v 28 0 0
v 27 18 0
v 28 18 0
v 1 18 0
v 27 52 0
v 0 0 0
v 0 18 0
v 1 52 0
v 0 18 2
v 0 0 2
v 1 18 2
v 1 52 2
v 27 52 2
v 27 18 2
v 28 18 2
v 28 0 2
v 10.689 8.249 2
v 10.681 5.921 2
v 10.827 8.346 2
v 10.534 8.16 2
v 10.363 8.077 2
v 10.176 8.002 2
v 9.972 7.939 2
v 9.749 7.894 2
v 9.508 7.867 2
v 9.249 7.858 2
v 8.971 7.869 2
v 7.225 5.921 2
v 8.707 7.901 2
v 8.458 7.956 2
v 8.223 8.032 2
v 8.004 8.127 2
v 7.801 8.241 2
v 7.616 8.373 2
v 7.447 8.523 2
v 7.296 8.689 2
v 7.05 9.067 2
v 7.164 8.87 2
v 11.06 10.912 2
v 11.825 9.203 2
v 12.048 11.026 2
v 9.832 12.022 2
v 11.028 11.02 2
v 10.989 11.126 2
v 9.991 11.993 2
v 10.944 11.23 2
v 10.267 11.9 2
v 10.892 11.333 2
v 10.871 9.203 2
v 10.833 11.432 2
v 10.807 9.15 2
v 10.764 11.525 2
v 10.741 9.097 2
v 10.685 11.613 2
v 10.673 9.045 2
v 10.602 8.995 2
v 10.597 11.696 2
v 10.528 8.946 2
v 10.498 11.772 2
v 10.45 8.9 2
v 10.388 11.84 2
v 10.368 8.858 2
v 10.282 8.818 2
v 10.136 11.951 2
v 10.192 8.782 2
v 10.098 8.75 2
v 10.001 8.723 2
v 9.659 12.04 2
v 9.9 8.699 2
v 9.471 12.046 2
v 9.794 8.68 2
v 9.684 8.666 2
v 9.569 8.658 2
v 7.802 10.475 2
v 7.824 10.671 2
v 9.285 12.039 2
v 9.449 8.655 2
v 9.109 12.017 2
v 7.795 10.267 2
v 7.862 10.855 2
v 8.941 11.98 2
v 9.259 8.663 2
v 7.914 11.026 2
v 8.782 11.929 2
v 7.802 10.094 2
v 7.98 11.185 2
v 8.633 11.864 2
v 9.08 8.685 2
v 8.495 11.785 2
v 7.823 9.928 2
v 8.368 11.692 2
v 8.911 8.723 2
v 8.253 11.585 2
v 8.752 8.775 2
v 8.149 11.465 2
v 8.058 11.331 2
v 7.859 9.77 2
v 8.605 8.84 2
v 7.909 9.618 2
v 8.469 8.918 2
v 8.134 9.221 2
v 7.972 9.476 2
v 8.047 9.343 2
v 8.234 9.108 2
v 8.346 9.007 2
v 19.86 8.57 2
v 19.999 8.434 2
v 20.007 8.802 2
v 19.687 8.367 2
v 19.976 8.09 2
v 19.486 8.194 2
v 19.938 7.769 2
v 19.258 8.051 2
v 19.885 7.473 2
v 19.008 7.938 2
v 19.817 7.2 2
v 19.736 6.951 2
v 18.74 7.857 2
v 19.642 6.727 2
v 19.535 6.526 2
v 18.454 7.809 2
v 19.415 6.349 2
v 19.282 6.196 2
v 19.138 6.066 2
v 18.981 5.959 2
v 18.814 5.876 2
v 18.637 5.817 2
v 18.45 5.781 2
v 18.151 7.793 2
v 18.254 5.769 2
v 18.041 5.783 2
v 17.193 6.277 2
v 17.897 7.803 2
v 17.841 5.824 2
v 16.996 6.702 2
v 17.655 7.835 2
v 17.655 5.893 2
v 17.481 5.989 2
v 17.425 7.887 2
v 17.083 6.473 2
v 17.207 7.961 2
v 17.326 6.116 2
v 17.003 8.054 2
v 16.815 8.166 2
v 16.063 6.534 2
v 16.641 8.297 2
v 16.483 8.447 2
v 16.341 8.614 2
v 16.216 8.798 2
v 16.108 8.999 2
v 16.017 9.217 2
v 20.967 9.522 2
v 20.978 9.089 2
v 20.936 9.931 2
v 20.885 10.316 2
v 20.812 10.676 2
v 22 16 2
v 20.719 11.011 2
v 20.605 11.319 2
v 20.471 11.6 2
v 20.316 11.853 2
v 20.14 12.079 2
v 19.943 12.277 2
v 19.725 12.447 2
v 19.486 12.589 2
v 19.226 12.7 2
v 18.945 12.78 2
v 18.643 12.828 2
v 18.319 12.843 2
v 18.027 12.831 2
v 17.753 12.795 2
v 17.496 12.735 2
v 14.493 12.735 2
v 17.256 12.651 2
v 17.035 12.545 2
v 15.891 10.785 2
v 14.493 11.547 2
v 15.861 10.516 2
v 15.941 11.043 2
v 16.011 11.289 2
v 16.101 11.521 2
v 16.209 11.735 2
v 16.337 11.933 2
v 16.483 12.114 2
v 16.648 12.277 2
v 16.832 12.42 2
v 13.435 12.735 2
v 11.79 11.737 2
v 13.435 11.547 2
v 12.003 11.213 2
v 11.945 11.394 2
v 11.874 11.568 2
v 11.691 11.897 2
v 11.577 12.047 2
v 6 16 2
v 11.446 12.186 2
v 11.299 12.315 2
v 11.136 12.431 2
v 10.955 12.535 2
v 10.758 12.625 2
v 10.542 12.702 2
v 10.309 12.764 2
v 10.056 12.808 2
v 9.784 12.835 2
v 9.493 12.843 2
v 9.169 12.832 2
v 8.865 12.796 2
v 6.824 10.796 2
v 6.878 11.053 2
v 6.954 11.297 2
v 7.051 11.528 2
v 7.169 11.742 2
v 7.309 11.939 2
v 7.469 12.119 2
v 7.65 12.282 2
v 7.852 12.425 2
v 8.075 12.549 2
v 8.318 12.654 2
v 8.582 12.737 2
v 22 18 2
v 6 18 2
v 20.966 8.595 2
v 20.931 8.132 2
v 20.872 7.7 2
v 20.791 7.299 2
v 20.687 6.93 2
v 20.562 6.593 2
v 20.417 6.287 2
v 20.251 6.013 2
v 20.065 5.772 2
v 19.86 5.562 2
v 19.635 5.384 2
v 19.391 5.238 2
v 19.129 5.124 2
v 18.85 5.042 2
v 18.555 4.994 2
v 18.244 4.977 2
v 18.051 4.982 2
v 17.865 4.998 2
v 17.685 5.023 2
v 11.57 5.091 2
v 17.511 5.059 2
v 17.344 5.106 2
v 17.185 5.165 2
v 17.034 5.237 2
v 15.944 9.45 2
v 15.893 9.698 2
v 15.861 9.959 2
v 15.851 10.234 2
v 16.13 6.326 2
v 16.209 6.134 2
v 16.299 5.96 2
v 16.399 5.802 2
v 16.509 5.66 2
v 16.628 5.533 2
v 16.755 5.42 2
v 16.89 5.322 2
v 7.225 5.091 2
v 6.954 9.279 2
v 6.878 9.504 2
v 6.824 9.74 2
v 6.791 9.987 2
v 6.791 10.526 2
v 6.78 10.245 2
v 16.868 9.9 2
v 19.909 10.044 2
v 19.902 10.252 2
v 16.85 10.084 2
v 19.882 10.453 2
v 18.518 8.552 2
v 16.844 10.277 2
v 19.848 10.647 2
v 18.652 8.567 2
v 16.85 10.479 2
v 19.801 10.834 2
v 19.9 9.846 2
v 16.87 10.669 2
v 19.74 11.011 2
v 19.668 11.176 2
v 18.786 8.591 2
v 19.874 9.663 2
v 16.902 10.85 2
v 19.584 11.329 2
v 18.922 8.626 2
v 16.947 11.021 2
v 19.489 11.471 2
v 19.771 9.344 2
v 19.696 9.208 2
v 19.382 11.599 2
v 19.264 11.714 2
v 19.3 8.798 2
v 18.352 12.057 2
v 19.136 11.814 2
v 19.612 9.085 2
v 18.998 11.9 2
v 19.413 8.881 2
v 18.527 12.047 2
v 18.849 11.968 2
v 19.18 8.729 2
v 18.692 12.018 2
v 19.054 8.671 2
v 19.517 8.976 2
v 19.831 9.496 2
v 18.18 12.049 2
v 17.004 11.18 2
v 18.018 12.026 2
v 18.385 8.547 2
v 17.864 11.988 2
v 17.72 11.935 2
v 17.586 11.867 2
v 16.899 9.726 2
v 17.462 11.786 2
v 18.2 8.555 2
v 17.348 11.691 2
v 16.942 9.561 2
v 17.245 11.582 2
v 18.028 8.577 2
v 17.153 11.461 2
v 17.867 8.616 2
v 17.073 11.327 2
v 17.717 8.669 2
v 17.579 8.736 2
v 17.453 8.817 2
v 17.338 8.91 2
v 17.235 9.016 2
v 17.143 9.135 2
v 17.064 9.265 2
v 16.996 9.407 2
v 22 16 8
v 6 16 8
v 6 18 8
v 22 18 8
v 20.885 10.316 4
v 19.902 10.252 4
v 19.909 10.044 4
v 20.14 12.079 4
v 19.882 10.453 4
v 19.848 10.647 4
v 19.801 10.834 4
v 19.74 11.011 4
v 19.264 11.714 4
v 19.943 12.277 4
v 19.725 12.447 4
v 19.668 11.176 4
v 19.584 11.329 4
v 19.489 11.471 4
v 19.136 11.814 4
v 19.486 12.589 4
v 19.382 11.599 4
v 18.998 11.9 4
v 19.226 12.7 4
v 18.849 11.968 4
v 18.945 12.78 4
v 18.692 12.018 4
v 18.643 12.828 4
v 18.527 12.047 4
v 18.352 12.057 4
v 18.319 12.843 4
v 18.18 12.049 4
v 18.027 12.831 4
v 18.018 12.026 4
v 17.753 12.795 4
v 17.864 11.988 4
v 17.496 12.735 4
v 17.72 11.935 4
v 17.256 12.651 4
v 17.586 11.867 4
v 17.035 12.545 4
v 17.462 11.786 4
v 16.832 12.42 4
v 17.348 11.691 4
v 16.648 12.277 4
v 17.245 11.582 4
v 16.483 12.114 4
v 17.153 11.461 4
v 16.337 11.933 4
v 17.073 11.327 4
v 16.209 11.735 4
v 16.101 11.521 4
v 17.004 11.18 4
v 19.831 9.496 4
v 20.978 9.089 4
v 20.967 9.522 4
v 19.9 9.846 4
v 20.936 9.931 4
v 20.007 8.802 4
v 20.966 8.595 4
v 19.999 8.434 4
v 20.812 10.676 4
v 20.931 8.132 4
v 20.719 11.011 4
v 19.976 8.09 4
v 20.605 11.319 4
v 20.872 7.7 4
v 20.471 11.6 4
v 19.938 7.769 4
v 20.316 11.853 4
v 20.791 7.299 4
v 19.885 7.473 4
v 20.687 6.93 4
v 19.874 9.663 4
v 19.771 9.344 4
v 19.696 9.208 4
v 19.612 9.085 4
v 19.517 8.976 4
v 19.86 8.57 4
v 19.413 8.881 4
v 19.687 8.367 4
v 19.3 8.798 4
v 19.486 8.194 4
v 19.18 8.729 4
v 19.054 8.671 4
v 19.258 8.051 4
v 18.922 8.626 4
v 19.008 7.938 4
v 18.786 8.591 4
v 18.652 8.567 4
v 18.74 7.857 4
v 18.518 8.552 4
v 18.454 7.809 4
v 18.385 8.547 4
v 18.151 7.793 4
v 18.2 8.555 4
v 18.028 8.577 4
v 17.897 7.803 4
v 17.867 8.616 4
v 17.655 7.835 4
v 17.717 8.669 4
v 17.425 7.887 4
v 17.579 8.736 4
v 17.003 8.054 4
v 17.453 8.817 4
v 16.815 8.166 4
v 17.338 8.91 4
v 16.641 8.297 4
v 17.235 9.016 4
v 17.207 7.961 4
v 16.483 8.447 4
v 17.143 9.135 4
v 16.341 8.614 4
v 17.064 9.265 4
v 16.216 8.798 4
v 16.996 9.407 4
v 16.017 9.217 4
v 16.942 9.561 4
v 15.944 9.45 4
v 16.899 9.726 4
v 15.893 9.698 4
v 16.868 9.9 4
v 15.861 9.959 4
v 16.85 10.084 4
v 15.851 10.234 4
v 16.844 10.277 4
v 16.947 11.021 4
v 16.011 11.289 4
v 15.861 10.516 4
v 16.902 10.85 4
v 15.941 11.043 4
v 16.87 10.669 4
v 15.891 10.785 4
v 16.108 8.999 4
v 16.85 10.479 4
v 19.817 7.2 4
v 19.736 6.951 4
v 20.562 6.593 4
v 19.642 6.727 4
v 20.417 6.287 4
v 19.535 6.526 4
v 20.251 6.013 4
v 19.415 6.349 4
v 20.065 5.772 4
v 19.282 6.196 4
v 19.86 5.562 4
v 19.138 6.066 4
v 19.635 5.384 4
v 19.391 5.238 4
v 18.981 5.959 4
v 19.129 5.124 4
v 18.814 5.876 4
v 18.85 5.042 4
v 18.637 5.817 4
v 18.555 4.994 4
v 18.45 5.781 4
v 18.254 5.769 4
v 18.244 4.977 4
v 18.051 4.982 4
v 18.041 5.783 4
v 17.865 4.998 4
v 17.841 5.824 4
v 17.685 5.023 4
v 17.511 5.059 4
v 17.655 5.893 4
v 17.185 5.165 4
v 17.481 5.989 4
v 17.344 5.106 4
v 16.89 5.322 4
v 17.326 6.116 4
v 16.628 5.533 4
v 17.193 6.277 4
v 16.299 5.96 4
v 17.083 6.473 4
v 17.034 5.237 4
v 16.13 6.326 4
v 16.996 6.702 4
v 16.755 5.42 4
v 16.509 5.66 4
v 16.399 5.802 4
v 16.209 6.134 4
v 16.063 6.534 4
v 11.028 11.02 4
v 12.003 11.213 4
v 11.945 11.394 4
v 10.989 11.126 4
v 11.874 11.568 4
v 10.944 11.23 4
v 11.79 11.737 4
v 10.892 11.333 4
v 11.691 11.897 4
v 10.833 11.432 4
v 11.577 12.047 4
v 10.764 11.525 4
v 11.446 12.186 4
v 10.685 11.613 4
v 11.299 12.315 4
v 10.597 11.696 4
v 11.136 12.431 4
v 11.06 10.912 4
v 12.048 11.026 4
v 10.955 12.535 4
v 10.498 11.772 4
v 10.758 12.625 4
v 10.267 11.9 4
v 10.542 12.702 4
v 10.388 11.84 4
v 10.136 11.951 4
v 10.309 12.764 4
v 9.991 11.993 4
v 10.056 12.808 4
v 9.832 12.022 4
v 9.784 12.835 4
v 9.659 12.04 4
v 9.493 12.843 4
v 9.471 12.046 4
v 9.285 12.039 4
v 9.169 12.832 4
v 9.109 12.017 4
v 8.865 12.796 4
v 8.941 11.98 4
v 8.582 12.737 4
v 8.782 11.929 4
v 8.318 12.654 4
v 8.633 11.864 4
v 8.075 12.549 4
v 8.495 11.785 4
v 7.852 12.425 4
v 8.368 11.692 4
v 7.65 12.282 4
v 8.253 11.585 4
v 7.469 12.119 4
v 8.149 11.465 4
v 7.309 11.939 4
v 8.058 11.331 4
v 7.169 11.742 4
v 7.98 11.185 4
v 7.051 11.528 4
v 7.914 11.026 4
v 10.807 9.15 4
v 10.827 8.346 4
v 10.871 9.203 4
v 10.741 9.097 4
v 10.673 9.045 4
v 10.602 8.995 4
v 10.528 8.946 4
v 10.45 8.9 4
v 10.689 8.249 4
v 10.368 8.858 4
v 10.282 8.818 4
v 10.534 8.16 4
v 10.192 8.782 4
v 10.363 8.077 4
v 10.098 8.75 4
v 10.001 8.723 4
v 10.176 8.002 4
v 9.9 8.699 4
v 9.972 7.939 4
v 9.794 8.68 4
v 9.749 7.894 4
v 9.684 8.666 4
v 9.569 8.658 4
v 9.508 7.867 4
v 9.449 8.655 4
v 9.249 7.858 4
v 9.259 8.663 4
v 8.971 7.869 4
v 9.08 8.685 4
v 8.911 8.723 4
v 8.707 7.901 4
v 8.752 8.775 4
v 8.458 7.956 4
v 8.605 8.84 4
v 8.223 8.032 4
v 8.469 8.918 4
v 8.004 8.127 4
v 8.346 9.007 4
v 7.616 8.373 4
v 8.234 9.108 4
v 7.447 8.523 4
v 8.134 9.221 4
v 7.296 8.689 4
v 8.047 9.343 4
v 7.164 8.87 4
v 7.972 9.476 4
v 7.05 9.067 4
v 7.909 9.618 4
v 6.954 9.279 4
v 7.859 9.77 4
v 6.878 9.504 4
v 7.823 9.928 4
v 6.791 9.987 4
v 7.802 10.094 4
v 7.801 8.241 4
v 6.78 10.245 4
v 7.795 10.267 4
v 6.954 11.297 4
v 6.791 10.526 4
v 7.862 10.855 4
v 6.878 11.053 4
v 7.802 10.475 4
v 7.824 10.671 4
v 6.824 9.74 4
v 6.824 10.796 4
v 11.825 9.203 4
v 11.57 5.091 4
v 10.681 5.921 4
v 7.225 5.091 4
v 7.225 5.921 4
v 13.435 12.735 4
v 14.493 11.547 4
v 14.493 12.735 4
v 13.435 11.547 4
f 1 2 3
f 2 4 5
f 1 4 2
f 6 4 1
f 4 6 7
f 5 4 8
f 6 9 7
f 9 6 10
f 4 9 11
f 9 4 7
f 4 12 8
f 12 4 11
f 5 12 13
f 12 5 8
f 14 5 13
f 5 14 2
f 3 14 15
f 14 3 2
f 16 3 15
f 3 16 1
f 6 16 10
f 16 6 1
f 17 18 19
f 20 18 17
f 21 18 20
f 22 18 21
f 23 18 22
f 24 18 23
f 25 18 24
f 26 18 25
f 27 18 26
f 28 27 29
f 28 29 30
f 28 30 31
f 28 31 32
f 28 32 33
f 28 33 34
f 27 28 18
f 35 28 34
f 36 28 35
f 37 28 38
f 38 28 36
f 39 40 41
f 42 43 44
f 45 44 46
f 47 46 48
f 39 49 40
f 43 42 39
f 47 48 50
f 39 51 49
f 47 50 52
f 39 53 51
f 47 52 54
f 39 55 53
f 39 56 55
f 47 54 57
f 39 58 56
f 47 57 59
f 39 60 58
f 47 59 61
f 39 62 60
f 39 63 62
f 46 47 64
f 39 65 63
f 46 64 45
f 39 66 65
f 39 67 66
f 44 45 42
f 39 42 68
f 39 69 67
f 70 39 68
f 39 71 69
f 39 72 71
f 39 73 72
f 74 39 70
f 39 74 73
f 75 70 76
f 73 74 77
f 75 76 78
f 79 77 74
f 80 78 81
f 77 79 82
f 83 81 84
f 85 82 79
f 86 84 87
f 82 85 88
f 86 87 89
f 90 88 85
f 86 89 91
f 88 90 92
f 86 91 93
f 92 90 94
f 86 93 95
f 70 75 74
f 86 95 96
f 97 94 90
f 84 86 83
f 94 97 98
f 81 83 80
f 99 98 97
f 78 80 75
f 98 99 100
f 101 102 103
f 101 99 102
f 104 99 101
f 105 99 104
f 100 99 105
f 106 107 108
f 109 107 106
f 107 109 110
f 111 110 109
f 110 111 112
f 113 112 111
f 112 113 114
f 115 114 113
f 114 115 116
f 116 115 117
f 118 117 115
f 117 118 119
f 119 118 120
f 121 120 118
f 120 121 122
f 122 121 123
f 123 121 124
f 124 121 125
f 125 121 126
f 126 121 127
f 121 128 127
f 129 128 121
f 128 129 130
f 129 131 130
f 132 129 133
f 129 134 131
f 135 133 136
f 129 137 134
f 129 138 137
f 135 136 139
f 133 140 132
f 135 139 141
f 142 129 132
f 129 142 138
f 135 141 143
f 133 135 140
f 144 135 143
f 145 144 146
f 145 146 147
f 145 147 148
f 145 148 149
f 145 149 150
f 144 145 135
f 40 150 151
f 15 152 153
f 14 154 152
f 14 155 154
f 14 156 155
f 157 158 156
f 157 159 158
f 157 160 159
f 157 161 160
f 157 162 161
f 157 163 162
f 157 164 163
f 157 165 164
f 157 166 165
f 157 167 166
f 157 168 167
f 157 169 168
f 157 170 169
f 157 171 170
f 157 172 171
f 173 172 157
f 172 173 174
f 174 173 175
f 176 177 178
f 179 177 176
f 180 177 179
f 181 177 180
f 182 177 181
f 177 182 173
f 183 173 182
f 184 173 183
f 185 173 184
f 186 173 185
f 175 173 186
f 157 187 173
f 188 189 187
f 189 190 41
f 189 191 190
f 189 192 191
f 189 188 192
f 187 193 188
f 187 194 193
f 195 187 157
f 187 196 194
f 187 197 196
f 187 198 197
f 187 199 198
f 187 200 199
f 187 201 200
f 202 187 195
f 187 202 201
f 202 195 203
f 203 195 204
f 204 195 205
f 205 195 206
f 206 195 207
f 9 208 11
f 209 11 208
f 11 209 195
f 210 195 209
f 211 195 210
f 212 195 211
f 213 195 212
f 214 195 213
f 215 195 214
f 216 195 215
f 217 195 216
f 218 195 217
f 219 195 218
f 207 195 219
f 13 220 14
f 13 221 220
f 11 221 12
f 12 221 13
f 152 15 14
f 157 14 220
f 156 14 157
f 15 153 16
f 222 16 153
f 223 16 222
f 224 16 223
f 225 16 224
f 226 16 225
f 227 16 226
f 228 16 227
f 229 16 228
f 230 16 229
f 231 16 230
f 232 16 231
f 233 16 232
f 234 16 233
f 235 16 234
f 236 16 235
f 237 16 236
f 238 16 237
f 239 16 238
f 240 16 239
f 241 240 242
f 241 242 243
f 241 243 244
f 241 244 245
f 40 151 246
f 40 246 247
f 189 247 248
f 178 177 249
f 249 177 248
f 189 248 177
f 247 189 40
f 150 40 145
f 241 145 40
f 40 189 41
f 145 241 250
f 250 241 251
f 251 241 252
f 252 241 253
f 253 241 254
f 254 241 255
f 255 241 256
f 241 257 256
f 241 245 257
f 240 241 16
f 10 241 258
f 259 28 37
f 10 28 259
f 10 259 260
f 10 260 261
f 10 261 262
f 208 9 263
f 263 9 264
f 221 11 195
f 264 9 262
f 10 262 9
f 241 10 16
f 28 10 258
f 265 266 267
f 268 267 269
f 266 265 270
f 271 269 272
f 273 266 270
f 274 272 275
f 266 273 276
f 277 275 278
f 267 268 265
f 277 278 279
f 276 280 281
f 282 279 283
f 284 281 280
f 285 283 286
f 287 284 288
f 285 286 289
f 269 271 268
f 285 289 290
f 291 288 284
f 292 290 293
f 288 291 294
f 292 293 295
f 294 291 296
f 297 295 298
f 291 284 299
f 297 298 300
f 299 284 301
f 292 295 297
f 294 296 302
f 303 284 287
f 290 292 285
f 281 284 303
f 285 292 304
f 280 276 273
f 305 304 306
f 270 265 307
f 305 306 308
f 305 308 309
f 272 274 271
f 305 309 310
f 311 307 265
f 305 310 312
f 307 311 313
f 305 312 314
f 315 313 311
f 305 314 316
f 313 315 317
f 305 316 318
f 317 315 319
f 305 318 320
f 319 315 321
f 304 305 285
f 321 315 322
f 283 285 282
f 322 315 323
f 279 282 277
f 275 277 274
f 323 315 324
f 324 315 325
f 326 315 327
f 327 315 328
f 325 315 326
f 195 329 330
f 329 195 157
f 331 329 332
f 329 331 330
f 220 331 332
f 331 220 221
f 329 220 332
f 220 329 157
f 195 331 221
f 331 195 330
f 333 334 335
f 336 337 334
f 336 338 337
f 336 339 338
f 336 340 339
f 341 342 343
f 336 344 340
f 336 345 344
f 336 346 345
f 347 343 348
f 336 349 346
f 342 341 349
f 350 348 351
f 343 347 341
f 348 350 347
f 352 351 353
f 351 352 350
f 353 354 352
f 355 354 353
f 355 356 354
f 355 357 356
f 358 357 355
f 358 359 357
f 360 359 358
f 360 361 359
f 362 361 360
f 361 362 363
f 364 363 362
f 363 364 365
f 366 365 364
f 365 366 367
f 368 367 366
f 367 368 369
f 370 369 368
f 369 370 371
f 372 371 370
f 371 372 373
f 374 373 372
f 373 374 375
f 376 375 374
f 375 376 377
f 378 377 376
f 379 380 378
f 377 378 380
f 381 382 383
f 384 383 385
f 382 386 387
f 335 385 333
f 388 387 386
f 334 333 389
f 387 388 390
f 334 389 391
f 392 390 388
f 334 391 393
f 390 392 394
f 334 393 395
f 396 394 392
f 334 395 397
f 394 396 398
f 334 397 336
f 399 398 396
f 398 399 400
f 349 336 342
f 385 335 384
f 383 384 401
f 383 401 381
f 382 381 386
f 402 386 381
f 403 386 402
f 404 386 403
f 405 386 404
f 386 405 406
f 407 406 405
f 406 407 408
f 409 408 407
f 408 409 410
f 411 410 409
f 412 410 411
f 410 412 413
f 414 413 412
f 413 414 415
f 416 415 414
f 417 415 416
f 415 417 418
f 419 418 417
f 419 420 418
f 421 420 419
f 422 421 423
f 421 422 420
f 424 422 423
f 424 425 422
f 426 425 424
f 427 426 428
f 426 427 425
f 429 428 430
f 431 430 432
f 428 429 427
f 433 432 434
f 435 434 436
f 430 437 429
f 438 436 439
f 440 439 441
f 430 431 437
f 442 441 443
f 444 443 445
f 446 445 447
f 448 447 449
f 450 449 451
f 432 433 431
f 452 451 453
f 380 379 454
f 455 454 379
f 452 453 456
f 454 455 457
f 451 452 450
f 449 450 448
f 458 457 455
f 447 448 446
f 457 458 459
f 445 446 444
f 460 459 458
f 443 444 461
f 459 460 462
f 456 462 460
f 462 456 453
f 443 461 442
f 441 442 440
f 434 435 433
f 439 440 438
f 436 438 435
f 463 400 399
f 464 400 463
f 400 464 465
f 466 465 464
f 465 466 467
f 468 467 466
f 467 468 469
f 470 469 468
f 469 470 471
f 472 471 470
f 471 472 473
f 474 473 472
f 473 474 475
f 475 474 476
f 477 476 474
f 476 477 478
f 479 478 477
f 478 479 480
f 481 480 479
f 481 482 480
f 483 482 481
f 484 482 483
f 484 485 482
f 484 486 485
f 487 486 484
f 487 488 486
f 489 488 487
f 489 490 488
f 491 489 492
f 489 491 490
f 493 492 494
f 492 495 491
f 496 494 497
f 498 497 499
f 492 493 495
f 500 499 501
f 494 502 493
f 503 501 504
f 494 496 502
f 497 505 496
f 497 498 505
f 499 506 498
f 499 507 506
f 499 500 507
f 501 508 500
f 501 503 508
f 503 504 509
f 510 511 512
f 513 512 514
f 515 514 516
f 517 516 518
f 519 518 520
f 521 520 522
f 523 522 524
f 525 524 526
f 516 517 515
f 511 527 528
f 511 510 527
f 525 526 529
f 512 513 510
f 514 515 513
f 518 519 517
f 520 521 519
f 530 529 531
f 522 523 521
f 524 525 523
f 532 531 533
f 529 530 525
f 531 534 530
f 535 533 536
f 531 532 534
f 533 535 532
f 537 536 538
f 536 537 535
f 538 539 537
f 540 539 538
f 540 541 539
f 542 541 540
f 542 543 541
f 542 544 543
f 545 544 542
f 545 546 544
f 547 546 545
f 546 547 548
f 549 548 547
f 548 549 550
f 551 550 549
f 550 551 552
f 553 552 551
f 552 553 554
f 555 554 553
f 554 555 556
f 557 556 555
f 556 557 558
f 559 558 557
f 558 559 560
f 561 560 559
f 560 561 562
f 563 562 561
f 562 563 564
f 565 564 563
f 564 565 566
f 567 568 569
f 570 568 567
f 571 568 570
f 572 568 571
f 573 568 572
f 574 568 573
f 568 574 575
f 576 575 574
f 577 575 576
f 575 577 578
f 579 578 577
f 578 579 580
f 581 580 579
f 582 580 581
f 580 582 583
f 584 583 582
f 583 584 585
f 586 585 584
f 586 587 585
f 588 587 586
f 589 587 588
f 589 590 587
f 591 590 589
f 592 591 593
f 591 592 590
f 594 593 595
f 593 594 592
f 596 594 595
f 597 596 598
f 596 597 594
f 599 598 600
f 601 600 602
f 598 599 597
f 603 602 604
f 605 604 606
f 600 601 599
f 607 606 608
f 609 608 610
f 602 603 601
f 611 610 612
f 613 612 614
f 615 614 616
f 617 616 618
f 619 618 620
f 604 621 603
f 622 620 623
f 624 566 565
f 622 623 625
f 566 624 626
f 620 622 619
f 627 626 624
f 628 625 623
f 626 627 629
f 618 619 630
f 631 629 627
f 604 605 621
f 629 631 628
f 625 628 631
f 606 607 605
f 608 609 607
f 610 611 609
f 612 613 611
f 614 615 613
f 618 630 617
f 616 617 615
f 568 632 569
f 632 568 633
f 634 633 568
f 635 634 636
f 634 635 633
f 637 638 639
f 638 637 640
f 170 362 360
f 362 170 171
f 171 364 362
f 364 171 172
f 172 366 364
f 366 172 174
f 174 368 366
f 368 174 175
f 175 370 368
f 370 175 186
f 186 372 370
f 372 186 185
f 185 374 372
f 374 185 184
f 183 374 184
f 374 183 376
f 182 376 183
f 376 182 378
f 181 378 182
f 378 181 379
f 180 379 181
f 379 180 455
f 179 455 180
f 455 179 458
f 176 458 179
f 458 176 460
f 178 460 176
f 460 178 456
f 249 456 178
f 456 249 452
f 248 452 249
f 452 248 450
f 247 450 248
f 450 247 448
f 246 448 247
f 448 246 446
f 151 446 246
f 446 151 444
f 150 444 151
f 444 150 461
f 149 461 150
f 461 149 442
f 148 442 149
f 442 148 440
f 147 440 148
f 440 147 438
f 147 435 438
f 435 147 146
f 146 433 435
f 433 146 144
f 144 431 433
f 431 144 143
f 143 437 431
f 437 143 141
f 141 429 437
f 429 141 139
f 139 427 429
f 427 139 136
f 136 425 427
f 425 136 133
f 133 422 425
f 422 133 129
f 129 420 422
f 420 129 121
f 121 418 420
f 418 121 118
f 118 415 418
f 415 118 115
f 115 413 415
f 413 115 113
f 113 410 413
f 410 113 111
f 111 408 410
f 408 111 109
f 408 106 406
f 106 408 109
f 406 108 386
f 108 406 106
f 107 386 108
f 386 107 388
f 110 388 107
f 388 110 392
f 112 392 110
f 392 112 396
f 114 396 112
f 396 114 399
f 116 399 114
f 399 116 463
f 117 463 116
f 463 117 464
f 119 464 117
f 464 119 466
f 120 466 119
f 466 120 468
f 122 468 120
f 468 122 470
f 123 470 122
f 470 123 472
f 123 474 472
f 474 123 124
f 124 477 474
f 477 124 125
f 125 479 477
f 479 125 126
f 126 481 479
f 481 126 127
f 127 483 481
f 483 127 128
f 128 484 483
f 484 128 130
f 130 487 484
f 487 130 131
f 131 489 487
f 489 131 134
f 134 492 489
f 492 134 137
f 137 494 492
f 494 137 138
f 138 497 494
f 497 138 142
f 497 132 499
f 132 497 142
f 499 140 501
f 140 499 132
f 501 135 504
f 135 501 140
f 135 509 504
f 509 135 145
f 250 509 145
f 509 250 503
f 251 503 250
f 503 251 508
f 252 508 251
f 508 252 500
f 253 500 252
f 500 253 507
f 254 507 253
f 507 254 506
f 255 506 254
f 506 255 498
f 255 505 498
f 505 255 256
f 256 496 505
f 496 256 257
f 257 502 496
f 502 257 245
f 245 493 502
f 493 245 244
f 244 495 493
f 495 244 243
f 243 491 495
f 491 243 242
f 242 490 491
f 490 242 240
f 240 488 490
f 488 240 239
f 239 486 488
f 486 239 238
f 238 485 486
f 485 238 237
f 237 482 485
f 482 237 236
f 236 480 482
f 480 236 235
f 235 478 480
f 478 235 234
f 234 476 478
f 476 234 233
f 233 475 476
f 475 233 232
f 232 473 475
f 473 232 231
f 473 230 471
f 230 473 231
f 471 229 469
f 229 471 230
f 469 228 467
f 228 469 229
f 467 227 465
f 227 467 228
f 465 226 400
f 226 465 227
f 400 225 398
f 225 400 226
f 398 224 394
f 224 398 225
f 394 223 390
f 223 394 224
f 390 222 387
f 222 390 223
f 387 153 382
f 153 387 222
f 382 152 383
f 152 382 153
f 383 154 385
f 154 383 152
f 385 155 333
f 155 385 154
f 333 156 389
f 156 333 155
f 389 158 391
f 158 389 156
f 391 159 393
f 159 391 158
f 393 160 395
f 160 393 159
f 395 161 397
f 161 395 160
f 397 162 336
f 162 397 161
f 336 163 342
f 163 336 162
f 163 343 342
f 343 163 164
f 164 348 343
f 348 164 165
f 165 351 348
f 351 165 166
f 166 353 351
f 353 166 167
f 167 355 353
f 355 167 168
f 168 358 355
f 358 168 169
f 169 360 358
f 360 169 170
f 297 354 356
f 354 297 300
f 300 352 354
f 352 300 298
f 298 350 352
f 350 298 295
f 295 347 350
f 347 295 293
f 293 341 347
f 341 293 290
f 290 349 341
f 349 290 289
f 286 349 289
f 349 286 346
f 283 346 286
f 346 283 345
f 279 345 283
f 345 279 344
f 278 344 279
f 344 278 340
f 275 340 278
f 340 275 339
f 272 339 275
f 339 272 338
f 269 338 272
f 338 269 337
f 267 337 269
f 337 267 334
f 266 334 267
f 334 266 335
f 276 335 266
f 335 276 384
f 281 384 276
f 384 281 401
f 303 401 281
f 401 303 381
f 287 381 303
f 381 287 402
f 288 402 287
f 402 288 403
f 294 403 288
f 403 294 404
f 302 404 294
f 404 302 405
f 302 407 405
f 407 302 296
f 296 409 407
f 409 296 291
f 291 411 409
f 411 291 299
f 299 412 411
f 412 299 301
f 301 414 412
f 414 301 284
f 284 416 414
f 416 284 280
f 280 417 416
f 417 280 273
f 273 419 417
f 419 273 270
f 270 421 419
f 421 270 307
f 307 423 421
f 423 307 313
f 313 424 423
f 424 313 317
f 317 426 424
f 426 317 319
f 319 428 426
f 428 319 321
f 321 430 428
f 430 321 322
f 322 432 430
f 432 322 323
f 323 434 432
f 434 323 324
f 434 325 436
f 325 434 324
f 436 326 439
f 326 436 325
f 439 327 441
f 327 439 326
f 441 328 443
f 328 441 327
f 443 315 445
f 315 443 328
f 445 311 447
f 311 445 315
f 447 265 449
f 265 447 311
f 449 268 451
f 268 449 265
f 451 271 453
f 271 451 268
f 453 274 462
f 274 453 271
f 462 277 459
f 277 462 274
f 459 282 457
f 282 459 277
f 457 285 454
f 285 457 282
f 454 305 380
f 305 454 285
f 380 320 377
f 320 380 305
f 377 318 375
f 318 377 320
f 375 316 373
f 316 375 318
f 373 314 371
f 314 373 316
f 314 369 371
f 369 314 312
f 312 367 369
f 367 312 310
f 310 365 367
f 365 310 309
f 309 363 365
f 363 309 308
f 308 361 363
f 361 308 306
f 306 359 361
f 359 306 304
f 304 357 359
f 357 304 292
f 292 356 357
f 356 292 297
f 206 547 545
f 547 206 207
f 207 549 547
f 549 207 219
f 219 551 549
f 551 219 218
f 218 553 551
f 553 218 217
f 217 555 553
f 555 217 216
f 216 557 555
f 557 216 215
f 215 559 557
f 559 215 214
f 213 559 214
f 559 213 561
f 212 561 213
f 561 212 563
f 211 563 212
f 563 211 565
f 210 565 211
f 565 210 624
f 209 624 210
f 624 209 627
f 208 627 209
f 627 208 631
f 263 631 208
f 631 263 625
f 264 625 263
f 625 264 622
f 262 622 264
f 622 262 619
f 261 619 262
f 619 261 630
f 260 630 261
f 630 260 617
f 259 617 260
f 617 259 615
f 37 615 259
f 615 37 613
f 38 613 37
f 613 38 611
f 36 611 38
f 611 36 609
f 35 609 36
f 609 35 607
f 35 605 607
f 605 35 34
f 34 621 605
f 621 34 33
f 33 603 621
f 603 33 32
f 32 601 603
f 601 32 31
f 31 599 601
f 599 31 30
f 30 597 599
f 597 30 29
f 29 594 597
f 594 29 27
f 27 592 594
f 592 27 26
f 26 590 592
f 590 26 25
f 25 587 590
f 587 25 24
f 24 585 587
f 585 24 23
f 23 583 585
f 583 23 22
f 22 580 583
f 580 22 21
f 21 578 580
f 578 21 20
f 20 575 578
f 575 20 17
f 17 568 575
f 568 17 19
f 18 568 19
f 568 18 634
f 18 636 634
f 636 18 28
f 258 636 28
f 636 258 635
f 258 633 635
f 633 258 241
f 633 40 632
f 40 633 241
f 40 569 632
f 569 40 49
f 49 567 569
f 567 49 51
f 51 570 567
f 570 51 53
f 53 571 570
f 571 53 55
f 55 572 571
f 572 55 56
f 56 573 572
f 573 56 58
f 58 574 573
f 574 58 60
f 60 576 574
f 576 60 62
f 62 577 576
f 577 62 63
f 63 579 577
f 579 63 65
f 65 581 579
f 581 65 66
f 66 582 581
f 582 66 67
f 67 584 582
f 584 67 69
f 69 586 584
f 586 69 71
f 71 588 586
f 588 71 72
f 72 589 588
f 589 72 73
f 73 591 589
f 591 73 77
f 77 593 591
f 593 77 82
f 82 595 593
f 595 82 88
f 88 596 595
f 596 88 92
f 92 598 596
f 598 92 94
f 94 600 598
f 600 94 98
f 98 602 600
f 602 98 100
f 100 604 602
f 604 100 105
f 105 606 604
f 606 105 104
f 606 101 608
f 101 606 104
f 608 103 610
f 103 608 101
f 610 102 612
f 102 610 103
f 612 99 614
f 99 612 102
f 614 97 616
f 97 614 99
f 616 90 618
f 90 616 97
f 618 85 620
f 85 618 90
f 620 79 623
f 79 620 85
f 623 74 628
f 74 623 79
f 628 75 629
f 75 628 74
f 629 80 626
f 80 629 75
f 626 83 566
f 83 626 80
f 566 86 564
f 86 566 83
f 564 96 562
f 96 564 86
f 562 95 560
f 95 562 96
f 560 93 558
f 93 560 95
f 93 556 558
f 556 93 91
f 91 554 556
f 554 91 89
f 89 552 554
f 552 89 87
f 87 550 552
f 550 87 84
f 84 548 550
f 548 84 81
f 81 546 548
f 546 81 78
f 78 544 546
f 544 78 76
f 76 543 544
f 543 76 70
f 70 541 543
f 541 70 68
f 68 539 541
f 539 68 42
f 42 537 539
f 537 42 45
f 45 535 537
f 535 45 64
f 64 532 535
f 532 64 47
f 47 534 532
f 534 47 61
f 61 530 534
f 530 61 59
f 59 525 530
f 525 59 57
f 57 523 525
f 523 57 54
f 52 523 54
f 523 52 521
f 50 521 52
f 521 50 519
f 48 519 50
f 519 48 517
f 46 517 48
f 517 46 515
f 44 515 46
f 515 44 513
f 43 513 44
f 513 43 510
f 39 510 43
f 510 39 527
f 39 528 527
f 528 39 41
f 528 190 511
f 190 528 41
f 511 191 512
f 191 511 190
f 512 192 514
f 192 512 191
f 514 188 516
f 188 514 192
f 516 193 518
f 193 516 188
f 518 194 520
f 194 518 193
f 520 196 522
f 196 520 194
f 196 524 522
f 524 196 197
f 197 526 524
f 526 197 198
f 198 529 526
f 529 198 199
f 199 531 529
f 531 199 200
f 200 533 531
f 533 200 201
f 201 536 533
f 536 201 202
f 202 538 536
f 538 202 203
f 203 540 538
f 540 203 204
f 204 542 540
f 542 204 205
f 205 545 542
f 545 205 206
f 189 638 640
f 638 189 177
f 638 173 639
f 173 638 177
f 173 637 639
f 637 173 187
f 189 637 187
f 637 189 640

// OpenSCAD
//Variables
base_plate_length_lower = 26;
base_plate_length_upper = 28;
base_plate_width_lower = 34;
base_plate_width_upper = 18;
base_plate_thickness = 2;

bar_length = 16;
bar_width = 2;
bar_height = 6;

diameter_hole = 6.5;
diameter_text_thickness = 2;
diameter_text_size = 8;

lower_bar_width = 2;
lower_bar_height = 2;
lower_bar_distance_from_bottom = 6;


//base plate
base_plate_points = [
[0,0,0], //0, start
[0,base_plate_width_upper,0], //1, links oben
[(base_plate_length_upper - base_plate_length_lower)/2,base_plate_width_upper,0], //2 linke kante untere platte
[(base_plate_length_upper - base_plate_length_lower)/2,base_plate_width_upper+base_plate_width_lower, 0],//3
[((base_plate_length_upper - base_plate_length_lower)/2)+base_plate_length_lower,base_plate_width_upper+base_plate_width_lower, 0],//4
[((base_plate_length_upper - base_plate_length_lower)/2)+base_plate_length_lower,base_plate_width_upper, 0],//5
[base_plate_length_upper,base_plate_width_upper, 0],//6
[base_plate_length_upper,0, 0],//7
[0,0,base_plate_thickness], //8, start
[0,base_plate_width_upper,base_plate_thickness], //9, links oben
[(base_plate_length_upper - base_plate_length_lower)/2,base_plate_width_upper,base_plate_thickness], //10 linke kante untere platte
[(base_plate_length_upper - base_plate_length_lower)/2,base_plate_width_upper+base_plate_width_lower, base_plate_thickness],//11
[((base_plate_length_upper - base_plate_length_lower)/2)+base_plate_length_lower,base_plate_width_upper+base_plate_width_lower, base_plate_thickness],//12
[((base_plate_length_upper - base_plate_length_lower)/2)+base_plate_length_lower,base_plate_width_upper, base_plate_thickness],//13
[base_plate_length_upper,base_plate_width_upper, base_plate_thickness],//14
[base_plate_length_upper,0, base_plate_thickness]//15
];

base_plate_faces = [
[7,6,5,4,3,2,1,0],//bottom
[0,1,9,8],
[1,2,10,9],
[2,3,11,10],
[3,4,12,11],
[4,5,13,12],
[5,6,14,13],
[6,7,15,14],
[7,0,8,15],
[8,9,10,11,12,13,14,15]
];
polyhedron(base_plate_points, base_plate_faces);

//top bar
translate([(base_plate_length_upper-bar_length)/2,base_plate_width_upper,base_plate_thickness])rotate([0,0,270])cube([bar_width, bar_length, bar_height]);

//diameter text
translate([base_plate_length_upper/2,base_plate_width_upper/2,base_plate_thickness])rotate([0,0,180])linear_extrude(diameter_text_thickness)text(str(diameter_hole), size=diameter_text_size,halign="center",valign="center");

//bottom bar/triangle
bottom_bar_points=[
[0,0,0], //0 base
[bar_length,0,0], //1 
[bar_length,0,lower_bar_height], //2
[0,0,lower_bar_height], //3
[0,lower_bar_width,0], //4
[bar_length,lower_bar_width,0], //5
[0,lower_bar_width,lower_bar_height] //6
];

bottom_bar_faces = [
[0,1,2,3],
[0,1,5,4],
[2,3,4,5],
[0,4,3],
[1,2,5],
];
translate([(base_plate_length_upper-bar_length)/2,base_plate_width_lower+base_plate_width_upper-lower_bar_distance_from_bottom,base_plate_thickness])translate([bar_length,0,0])rotate([0,0,180])polyhedron(bottom_bar_points, bottom_bar_faces);
